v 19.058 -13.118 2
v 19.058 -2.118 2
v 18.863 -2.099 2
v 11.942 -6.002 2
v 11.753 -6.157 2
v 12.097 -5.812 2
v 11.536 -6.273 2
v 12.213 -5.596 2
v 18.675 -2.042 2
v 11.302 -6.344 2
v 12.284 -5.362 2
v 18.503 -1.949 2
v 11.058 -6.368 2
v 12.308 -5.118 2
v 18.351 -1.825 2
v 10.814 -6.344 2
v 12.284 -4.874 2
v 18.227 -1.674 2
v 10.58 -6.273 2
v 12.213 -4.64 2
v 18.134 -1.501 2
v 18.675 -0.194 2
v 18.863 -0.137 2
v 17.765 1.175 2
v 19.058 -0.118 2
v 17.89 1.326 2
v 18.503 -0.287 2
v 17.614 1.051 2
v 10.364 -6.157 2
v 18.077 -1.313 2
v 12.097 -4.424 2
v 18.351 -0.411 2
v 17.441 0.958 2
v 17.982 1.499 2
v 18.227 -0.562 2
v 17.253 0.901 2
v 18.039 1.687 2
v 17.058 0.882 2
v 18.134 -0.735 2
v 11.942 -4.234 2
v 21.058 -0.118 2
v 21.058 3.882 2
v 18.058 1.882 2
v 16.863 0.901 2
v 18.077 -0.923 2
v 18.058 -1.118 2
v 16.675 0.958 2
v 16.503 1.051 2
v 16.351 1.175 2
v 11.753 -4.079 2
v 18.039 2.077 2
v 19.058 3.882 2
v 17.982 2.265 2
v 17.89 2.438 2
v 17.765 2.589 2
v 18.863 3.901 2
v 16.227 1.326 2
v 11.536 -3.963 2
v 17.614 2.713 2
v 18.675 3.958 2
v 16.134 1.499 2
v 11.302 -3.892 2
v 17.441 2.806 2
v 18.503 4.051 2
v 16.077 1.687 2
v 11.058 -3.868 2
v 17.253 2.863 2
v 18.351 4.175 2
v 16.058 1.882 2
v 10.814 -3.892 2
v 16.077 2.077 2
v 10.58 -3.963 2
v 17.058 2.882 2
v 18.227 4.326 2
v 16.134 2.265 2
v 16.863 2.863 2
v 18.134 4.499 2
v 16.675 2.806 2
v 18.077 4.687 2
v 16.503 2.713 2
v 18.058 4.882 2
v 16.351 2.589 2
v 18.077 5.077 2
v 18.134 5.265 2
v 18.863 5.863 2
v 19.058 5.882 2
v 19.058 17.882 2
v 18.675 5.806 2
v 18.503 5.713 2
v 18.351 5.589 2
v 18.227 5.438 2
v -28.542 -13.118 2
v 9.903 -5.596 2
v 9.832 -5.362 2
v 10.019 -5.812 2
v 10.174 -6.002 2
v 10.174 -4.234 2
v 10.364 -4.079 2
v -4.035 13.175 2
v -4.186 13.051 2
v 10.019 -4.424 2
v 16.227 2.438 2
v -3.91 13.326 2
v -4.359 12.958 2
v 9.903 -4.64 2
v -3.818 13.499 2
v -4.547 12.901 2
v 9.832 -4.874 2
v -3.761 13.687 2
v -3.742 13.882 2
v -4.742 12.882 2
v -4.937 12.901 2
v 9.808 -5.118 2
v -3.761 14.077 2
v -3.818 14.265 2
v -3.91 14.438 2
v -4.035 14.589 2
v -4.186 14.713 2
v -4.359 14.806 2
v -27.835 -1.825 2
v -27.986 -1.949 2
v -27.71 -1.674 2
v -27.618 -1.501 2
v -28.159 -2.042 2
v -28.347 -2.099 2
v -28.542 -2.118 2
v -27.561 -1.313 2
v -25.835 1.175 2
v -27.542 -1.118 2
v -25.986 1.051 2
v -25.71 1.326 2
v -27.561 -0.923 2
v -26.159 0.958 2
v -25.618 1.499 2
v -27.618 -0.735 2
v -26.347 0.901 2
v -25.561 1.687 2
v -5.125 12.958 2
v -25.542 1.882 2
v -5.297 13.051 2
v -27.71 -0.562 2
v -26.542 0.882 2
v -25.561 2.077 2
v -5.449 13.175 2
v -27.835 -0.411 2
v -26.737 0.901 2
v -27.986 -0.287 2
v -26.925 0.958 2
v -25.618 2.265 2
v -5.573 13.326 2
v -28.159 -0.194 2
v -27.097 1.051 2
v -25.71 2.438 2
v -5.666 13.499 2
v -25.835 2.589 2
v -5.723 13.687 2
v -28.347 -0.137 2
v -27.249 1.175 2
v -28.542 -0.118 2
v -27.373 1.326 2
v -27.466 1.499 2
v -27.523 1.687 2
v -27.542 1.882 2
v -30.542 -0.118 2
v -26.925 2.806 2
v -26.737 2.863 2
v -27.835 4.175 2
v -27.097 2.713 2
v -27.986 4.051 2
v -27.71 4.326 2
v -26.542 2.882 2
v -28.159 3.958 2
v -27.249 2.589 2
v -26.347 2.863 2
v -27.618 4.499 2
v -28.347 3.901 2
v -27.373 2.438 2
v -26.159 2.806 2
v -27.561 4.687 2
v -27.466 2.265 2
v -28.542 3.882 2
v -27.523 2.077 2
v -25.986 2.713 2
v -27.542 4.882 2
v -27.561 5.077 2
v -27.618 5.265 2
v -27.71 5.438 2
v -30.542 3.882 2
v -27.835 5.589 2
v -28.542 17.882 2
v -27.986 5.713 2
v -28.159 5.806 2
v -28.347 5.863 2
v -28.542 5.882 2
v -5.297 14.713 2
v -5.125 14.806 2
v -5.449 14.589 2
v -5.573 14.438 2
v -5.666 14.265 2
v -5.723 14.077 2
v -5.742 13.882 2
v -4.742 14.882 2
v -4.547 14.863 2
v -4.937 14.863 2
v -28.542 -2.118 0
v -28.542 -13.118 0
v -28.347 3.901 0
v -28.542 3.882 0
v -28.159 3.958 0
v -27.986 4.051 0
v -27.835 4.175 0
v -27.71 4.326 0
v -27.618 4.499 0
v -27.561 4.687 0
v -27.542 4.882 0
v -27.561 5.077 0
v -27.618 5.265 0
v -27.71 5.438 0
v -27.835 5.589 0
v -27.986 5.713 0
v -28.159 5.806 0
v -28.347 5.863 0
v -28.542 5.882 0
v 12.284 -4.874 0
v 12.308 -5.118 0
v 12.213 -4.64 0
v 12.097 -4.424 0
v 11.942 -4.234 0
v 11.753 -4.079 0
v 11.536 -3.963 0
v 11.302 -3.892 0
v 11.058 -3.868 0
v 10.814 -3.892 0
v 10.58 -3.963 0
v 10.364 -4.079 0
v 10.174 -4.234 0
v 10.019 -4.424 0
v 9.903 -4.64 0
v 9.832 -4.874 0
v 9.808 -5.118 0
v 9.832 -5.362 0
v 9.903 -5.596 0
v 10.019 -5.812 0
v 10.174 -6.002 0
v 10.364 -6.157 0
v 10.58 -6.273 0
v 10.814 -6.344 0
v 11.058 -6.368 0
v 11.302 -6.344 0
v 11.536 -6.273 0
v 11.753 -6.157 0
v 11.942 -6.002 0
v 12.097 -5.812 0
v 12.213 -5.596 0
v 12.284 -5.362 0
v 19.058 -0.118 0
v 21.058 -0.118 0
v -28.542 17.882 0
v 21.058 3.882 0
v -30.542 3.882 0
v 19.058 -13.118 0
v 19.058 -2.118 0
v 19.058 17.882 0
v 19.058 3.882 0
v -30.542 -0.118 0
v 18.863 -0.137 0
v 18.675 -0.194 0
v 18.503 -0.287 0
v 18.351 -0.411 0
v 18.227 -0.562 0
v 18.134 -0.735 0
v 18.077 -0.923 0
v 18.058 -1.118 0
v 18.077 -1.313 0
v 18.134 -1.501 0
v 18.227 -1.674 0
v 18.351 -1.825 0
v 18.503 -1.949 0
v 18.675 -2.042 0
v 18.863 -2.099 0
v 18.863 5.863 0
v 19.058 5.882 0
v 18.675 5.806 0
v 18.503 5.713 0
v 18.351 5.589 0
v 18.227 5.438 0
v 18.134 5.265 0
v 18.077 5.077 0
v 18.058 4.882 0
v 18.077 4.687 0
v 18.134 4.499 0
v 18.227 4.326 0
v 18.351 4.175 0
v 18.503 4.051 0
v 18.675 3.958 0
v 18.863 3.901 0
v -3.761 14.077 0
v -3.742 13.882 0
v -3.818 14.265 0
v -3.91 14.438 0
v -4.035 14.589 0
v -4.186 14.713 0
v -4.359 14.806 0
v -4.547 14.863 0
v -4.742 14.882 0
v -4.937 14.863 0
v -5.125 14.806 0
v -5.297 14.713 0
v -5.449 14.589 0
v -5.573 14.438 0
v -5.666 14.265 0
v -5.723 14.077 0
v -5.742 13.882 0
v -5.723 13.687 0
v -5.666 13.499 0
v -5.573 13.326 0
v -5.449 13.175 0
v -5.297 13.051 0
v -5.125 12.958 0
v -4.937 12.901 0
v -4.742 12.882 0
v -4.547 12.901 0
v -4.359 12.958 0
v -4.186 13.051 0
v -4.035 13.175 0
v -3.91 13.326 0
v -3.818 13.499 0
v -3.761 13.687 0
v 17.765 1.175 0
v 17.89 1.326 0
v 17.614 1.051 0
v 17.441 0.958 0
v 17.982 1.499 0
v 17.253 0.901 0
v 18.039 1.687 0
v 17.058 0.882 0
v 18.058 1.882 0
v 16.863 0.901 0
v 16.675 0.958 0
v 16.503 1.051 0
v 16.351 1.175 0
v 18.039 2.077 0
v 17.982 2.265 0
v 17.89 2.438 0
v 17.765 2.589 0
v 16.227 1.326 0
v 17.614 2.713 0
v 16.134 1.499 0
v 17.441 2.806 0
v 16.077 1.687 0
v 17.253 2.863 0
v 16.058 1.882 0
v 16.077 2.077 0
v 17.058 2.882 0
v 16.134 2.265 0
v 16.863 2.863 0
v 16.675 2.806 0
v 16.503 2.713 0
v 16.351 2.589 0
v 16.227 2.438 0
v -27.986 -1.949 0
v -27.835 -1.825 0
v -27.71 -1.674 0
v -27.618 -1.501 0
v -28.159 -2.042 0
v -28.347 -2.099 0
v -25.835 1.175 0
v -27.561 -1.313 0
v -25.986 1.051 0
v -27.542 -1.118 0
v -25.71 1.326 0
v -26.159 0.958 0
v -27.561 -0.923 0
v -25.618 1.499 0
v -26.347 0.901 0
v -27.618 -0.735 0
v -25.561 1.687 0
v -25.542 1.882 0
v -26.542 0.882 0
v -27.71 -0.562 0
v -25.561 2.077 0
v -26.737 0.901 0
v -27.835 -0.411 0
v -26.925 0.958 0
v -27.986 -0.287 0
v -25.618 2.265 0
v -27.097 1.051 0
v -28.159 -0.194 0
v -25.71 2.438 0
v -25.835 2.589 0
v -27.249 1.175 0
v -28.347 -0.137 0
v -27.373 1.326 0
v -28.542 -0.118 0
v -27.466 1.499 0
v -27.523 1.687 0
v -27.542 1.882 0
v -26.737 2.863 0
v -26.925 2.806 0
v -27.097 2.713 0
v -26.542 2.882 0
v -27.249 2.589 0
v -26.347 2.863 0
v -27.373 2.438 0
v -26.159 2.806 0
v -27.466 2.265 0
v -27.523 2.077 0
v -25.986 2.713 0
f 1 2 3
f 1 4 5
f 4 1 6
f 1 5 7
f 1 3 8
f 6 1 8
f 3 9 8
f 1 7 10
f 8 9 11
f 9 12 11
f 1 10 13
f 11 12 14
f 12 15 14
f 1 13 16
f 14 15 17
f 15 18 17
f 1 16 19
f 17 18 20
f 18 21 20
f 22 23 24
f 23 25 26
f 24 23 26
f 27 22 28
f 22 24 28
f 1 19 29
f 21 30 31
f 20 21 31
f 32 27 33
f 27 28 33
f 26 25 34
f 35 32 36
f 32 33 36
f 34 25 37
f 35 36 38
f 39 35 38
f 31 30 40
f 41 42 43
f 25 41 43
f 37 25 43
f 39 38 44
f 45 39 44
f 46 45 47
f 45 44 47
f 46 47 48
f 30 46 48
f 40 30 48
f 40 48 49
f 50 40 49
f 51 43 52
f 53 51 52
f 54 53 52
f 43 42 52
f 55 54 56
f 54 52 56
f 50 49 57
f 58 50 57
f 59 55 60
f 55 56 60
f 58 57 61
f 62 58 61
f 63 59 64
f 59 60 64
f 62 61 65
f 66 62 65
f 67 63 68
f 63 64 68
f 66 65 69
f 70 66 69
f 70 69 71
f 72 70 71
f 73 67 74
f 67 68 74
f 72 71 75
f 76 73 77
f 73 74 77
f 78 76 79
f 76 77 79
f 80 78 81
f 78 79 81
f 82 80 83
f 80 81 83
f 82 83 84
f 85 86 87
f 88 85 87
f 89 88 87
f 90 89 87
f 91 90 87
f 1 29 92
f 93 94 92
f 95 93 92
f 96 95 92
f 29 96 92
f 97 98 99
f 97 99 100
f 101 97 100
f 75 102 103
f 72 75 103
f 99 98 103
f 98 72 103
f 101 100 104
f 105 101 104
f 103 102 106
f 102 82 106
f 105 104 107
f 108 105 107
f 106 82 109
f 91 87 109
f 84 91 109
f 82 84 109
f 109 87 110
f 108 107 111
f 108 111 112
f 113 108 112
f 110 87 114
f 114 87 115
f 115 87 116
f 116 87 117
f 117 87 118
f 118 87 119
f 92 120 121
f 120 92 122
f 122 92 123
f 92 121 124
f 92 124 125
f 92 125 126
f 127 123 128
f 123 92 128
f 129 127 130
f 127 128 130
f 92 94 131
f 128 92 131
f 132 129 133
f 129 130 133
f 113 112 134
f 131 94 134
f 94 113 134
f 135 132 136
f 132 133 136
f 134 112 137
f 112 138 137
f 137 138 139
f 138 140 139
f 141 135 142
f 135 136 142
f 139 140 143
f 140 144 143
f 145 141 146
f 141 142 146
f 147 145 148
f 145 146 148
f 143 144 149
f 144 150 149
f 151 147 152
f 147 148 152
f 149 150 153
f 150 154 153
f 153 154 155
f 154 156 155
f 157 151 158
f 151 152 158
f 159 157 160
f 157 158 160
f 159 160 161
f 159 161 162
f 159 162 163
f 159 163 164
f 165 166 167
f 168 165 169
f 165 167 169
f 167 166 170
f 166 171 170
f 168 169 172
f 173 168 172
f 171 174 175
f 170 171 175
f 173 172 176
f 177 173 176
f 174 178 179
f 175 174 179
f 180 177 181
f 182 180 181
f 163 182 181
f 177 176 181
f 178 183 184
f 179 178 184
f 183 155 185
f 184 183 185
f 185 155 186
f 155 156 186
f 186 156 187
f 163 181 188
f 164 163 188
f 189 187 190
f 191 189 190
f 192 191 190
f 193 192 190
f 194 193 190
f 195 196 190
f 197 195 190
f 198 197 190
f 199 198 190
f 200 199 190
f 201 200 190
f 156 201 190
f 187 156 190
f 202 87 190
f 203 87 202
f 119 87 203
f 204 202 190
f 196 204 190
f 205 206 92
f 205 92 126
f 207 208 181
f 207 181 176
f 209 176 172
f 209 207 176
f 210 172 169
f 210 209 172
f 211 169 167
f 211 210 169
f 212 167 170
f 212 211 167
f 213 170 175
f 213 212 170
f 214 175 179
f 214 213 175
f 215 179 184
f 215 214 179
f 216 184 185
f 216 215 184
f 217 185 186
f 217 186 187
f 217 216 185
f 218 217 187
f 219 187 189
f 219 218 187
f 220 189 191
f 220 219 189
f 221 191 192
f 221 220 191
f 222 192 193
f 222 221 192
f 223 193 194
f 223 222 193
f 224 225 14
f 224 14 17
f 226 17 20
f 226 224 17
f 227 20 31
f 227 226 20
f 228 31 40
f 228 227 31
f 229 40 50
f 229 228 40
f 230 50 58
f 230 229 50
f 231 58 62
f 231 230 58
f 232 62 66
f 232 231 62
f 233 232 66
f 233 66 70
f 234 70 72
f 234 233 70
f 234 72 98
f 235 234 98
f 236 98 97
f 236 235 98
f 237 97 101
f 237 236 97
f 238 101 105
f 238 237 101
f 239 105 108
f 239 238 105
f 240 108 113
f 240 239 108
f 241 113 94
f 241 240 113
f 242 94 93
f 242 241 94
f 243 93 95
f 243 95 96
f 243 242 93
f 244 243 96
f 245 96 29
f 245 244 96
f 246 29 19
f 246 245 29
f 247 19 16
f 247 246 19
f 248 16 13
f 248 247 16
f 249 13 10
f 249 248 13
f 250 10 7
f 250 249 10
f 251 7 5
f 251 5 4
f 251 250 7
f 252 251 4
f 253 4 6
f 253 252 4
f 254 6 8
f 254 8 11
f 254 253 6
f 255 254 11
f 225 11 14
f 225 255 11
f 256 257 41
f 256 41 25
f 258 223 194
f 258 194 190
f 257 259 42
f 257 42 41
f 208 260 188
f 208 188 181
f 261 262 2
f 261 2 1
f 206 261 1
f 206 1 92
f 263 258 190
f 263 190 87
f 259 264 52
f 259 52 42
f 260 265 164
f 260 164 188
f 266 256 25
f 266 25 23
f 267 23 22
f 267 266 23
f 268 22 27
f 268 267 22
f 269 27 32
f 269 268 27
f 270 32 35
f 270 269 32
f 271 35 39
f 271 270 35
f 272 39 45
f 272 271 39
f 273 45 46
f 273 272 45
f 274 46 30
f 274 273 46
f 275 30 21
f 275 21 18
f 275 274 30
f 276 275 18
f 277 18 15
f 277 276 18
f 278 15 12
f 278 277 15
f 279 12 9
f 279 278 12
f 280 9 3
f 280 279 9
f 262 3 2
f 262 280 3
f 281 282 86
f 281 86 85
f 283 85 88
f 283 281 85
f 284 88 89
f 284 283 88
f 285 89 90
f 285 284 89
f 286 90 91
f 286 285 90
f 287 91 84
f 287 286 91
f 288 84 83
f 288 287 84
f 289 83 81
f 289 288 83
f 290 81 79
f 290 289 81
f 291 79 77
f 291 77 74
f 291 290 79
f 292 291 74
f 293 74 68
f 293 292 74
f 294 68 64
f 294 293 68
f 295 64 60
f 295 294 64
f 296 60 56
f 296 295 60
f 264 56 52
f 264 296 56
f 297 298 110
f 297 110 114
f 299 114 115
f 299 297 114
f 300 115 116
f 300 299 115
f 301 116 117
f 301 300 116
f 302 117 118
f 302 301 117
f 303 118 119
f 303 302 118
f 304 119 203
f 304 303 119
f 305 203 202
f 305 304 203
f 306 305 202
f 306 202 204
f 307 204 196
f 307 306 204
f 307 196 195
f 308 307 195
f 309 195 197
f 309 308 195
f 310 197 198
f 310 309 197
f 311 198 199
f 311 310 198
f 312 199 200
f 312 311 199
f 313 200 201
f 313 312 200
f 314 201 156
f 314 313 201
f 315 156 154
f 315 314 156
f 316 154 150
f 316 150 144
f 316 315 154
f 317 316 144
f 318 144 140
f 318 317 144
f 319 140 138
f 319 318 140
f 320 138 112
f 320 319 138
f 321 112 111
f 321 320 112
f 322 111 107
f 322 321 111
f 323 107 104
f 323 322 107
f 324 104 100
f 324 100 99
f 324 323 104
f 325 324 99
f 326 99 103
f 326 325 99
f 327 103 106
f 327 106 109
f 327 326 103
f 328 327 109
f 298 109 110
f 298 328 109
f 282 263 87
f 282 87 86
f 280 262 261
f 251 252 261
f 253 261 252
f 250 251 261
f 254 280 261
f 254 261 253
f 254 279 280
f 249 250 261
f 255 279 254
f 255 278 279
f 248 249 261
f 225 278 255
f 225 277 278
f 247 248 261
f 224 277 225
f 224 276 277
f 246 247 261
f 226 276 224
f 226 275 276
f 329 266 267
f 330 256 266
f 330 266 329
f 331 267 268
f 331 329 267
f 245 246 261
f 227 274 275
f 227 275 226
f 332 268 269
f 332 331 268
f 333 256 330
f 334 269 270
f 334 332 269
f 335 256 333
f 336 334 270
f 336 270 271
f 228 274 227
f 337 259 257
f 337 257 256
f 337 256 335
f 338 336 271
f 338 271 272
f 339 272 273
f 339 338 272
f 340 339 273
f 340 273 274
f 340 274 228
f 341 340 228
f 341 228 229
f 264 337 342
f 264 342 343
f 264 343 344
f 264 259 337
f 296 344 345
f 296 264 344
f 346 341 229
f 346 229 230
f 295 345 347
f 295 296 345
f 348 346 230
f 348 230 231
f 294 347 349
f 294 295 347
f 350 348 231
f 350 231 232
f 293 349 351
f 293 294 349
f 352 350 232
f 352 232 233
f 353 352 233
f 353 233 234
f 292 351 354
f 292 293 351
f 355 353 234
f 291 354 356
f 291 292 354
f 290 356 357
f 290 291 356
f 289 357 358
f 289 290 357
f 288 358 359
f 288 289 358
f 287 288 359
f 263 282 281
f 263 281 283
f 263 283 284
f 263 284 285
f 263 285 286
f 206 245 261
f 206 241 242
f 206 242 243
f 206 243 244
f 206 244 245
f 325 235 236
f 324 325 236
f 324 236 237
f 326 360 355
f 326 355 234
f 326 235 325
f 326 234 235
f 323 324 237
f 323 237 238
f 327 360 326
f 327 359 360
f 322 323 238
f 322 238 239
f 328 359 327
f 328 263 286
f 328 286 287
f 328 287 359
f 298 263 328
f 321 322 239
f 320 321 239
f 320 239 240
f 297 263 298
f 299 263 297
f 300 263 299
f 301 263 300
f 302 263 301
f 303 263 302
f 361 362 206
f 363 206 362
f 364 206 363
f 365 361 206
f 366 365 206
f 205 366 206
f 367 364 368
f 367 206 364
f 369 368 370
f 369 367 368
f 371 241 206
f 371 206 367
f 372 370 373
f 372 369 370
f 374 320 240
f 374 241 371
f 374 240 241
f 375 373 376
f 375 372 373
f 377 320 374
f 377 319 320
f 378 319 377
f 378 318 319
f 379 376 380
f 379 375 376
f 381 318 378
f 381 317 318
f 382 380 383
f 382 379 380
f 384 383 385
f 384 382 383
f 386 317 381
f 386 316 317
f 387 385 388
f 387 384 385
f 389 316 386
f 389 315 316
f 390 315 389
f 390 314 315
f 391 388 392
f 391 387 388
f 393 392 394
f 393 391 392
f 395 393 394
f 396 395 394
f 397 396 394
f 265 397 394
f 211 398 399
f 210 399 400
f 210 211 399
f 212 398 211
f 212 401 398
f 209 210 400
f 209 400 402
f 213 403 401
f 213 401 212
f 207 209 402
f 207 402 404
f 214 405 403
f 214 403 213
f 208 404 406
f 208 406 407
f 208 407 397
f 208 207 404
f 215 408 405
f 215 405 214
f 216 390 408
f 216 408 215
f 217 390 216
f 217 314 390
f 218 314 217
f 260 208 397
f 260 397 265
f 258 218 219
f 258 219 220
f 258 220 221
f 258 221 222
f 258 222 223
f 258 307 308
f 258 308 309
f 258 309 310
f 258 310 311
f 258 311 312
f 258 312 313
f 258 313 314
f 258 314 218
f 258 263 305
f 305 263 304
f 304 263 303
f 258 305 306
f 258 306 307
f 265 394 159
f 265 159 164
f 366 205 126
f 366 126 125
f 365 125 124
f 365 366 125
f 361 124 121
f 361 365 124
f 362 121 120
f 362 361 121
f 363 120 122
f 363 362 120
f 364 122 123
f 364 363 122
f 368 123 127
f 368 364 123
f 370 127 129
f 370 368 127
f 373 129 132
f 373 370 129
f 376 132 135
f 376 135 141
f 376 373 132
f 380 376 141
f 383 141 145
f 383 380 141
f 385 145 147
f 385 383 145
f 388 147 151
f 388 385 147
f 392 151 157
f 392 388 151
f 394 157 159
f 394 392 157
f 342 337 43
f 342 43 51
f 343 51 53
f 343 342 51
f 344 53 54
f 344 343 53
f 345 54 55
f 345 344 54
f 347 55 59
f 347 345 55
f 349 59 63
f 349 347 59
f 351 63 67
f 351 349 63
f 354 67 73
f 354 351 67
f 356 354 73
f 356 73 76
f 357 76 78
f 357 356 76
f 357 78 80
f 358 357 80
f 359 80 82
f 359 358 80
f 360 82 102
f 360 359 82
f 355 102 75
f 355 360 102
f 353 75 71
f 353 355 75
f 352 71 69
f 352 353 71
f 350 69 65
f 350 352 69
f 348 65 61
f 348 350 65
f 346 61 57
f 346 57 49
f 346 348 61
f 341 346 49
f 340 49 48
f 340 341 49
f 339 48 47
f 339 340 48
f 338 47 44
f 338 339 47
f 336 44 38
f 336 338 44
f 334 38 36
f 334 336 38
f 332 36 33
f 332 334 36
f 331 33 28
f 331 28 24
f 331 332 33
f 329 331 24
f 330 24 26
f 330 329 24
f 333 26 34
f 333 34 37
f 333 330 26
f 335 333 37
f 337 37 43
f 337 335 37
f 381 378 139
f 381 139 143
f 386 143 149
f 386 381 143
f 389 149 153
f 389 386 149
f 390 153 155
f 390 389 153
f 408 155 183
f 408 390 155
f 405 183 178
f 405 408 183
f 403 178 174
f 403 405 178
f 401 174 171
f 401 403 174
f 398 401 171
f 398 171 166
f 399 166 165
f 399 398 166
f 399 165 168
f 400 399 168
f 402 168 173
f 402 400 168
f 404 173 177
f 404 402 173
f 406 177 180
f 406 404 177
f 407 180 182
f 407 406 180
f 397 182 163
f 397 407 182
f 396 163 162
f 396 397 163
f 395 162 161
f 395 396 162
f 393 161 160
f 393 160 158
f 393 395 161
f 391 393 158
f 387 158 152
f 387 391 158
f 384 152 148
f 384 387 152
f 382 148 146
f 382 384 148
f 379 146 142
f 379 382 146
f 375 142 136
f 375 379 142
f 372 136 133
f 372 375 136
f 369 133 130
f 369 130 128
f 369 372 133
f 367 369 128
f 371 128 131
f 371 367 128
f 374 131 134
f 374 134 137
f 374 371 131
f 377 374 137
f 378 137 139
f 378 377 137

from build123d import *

# Parameters (mm, degrees)
SKETCH_1_R      = 1.25
SKETCH_1_R_2    = 1
EXTRUDE_2_DEPTH = 2


with BuildPart() as part:
    # 草圖1 → 填料-伸長2 (new body)
    with BuildSketch(Plane.XY):
        with BuildLine():
            Line((18.058094933, -13.1179941), (-27.541905067, -13.1179941))
            Line((-27.541905067, -13.1179941), (-28.541905067, -13.1179941))
            Line((-28.541905067, -13.1179941), (-28.541905067, -12.1179941))
            Line((-28.541905067, -12.1179941), (-28.541905067, -2.1179941))
            ThreePointArc((-28.541905067, -2.1179941), (-27.541905067, -1.1179941), (-28.541905067, -0.1179941))
            Line((-28.541905067, -0.1179941), (-30.541905067, -0.1179941))
            Line((-30.541905067, -0.1179941), (-30.541905067, 3.8820059))
            Line((-30.541905067, 3.8820059), (-28.541905067, 3.8820059))
            ThreePointArc((-28.541905067, 3.8820059), (-27.541905067, 4.8820059), (-28.541905067, 5.8820059))
            Line((-28.541905067, 5.8820059), (-28.541905067, 9.8820059))
            Line((-28.541905067, 9.8820059), (-28.541905067, 10.8820059))
            Line((-28.541905067, 10.8820059), (-28.541905067, 16.8820059))
            Line((-28.541905067, 16.8820059), (-28.541905067, 17.8820059))
            Line((-28.541905067, 17.8820059), (-27.541905067, 17.8820059))
            Line((-27.541905067, 17.8820059), (18.058094933, 17.8820059))
            Line((18.058094933, 17.8820059), (19.058094933, 17.8820059))
            Line((19.058094933, 17.8820059), (19.058094933, 16.8820059))
            Line((19.058094933, 16.8820059), (19.058094933, 10.8820059))
            Line((19.058094933, 10.8820059), (19.058094933, 9.8820059))
            Line((19.058094933, 9.8820059), (19.058094933, 5.8820059))
            ThreePointArc((19.058094933, 5.8820059), (18.058094933, 4.8820059), (19.058094933, 3.8820059))
            Line((19.058094933, 3.8820059), (21.058094933, 3.8820059))
            Line((21.058094933, 3.8820059), (21.058094933, -0.1179941))
            Line((21.058094933, -0.1179941), (19.058094933, -0.1179941))
            ThreePointArc((19.058094933, -0.1179941), (18.058094933, -1.1179941), (19.058094933, -2.1179941))
            Line((19.058094933, -2.1179941), (19.058094933, -12.1179941))
            Line((19.058094933, -12.1179941), (19.058094933, -13.1179941))
            Line((19.058094933, -13.1179941), (18.058094933, -13.1179941))
        make_face()
        with Locations((11.058094933, -5.1179941)):
            Circle(SKETCH_1_R, mode=Mode.SUBTRACT)
        with Locations((-26.541905067, 1.8820059)):
            Circle(SKETCH_1_R_2, mode=Mode.SUBTRACT)
        with Locations((17.058094933, 1.8820059)):
            Circle(SKETCH_1_R_2, mode=Mode.SUBTRACT)
        with Locations((-4.741905067, 13.8820059)):
            Circle(SKETCH_1_R_2, mode=Mode.SUBTRACT)
    extrude(amount=EXTRUDE_2_DEPTH)


solid = part.part
